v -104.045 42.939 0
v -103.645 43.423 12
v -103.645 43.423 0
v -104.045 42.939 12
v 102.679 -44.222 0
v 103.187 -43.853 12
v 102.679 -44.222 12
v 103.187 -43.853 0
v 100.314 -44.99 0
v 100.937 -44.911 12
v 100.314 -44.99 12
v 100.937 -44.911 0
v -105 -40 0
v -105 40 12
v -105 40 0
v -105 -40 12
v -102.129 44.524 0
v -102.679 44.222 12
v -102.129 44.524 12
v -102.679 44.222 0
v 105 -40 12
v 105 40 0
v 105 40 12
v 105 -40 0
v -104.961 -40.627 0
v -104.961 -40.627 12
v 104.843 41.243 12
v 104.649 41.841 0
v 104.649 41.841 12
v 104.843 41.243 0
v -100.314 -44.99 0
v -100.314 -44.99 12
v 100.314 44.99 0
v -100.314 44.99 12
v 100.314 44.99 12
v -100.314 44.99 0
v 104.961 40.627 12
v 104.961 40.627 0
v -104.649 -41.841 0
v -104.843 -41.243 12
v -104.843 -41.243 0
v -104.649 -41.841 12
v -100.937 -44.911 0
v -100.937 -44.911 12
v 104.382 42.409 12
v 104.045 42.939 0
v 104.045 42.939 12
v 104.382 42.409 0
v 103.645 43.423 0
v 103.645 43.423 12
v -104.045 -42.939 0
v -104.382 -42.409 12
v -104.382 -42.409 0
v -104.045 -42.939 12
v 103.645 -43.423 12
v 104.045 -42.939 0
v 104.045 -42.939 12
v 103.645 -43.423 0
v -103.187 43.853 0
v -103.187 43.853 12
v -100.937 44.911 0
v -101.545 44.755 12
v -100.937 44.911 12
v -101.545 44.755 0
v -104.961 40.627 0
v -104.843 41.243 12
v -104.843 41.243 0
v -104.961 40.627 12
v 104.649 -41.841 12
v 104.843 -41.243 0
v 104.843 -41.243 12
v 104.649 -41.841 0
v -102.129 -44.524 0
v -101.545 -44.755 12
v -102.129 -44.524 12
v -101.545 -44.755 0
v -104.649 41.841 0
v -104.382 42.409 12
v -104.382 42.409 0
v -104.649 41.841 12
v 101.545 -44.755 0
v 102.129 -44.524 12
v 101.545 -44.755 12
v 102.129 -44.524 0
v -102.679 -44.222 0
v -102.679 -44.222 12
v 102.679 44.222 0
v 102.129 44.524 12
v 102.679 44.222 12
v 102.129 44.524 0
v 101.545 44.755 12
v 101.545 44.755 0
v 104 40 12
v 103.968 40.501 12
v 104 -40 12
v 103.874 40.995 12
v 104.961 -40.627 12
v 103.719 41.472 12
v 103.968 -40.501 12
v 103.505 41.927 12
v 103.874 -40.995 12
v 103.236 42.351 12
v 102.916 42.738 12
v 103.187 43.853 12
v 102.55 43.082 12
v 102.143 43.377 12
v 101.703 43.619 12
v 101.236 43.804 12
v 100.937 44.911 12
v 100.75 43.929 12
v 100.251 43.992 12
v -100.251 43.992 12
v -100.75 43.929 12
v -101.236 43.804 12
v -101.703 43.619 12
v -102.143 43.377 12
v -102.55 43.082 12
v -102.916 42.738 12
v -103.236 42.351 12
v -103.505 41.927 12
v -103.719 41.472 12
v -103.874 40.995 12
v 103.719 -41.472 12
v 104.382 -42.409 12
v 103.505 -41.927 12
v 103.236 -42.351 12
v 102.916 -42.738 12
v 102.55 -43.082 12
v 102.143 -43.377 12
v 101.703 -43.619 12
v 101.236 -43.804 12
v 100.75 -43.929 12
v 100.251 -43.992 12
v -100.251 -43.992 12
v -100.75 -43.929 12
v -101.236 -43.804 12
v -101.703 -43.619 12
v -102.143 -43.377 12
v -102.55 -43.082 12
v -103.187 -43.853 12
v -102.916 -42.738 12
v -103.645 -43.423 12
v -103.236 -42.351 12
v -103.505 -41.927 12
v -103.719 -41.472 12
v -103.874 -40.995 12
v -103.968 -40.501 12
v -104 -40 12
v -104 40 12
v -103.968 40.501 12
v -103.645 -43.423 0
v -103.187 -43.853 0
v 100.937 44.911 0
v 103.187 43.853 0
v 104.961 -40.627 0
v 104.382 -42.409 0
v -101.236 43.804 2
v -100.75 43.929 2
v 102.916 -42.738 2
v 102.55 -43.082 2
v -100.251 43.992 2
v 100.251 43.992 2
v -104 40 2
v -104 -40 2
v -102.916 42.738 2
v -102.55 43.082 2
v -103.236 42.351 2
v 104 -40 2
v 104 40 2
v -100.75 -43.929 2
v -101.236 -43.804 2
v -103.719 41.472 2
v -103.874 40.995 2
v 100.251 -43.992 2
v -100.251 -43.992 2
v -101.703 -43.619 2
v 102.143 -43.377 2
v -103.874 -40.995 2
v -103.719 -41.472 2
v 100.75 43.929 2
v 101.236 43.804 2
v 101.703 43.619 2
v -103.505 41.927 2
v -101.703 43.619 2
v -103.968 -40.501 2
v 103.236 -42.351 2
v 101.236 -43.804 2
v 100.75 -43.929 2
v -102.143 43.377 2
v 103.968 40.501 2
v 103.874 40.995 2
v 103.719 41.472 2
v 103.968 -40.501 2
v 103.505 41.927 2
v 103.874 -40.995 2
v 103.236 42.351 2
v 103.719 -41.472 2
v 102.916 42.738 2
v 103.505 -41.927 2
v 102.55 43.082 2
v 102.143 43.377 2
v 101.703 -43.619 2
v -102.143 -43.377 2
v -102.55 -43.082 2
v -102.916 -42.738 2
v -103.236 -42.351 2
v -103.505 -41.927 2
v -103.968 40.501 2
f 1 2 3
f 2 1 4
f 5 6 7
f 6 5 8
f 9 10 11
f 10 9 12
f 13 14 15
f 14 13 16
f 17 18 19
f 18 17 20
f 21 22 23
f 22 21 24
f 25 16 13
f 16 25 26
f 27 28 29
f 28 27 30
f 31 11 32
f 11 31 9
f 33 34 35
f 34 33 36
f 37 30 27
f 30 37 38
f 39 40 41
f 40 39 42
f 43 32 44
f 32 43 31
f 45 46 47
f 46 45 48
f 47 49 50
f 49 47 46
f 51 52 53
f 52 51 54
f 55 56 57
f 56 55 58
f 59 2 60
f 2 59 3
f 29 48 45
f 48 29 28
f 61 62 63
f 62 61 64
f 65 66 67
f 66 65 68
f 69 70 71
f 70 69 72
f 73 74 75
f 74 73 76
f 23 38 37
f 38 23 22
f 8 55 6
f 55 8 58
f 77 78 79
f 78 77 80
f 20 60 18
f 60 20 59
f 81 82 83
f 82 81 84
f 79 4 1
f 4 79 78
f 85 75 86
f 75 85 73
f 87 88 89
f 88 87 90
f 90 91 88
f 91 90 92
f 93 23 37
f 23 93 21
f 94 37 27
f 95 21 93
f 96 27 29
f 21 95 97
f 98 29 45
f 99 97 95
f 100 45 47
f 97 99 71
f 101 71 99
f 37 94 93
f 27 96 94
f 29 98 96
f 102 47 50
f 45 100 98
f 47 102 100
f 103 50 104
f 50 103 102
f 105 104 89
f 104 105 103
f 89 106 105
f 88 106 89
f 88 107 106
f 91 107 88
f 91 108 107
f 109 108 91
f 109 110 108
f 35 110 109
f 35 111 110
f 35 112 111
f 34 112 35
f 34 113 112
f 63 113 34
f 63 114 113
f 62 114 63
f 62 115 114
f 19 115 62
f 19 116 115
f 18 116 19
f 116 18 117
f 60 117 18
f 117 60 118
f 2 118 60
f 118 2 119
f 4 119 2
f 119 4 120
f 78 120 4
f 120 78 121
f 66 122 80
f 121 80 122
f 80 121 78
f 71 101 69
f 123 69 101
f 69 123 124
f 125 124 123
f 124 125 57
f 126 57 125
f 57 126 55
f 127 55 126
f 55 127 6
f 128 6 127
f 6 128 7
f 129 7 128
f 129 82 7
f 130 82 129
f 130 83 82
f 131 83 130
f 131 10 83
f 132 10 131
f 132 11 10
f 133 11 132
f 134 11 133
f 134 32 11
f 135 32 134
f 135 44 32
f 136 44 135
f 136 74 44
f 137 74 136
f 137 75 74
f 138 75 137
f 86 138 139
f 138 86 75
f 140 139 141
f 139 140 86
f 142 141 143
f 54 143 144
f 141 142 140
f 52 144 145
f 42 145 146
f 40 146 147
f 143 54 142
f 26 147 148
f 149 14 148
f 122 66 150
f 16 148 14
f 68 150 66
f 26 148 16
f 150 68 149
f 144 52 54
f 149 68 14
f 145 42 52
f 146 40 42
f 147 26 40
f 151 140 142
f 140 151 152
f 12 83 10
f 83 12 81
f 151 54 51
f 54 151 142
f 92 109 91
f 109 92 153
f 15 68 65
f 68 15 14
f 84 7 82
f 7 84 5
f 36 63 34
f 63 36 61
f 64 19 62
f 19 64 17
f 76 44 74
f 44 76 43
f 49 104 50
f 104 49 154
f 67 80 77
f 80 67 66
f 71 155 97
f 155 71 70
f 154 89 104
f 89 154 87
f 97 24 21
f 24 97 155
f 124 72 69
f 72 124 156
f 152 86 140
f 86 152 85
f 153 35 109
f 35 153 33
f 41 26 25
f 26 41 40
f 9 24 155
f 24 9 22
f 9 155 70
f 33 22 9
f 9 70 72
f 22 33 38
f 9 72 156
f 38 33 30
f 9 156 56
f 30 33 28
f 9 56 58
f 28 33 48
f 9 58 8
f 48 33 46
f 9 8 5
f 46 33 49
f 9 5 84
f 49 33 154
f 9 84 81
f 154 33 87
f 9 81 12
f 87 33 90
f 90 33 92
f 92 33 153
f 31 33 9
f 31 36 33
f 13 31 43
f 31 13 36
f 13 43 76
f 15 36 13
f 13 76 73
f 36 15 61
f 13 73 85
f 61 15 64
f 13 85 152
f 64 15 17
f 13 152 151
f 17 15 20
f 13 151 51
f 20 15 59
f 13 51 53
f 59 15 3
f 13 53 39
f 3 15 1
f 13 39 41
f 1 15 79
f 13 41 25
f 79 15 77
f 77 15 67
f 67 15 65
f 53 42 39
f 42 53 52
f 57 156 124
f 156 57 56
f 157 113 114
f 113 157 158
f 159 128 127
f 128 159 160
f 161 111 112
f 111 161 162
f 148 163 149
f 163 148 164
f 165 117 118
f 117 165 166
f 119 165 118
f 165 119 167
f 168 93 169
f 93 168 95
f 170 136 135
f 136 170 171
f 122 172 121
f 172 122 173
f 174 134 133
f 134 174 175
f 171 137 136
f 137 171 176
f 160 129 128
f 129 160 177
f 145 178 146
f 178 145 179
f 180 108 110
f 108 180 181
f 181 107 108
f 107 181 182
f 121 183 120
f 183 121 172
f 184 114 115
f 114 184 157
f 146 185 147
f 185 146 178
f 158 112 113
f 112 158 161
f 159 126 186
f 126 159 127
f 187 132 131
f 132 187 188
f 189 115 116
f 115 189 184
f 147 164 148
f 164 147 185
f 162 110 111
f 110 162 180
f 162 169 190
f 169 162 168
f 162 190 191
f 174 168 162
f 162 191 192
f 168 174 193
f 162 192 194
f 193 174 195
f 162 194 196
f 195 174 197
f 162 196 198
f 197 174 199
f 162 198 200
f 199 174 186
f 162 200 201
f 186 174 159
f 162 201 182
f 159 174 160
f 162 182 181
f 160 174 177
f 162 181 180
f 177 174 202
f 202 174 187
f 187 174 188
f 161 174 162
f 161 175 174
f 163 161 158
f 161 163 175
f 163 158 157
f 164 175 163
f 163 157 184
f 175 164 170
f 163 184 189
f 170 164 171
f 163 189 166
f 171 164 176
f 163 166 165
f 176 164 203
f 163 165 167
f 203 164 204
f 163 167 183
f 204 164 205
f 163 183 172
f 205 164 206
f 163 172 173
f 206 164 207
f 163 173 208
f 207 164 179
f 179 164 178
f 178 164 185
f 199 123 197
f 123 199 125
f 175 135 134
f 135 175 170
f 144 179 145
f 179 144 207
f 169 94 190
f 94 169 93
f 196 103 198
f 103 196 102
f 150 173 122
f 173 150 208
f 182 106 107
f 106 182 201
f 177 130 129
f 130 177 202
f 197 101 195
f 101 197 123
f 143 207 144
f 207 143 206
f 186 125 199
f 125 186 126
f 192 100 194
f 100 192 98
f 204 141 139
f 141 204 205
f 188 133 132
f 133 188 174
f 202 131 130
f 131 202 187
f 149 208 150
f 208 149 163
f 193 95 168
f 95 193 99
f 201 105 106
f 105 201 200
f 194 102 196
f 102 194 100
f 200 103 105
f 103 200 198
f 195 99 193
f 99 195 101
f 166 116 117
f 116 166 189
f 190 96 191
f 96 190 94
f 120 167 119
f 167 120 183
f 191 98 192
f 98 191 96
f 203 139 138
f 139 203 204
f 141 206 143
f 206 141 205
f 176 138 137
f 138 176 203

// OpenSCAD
$fn = 50;


difference() {
	union() {
		hull() {
			translate(v = [-100.0000000000, 40.0000000000, 0]) {
				cylinder(h = 12, r = 5);
			}
			translate(v = [100.0000000000, 40.0000000000, 0]) {
				cylinder(h = 12, r = 5);
			}
			translate(v = [-100.0000000000, -40.0000000000, 0]) {
				cylinder(h = 12, r = 5);
			}
			translate(v = [100.0000000000, -40.0000000000, 0]) {
				cylinder(h = 12, r = 5);
			}
		}
	}
	union() {
		translate(v = [0, 0, 2]) {
			hull() {
				translate(v = [-100.0000000000, 40.0000000000, 0]) {
					cylinder(h = 10, r = 4);
				}
				translate(v = [100.0000000000, 40.0000000000, 0]) {
					cylinder(h = 10, r = 4);
				}
				translate(v = [-100.0000000000, -40.0000000000, 0]) {
					cylinder(h = 10, r = 4);
				}
				translate(v = [100.0000000000, -40.0000000000, 0]) {
					cylinder(h = 10, r = 4);
				}
			}
		}
	}
}
